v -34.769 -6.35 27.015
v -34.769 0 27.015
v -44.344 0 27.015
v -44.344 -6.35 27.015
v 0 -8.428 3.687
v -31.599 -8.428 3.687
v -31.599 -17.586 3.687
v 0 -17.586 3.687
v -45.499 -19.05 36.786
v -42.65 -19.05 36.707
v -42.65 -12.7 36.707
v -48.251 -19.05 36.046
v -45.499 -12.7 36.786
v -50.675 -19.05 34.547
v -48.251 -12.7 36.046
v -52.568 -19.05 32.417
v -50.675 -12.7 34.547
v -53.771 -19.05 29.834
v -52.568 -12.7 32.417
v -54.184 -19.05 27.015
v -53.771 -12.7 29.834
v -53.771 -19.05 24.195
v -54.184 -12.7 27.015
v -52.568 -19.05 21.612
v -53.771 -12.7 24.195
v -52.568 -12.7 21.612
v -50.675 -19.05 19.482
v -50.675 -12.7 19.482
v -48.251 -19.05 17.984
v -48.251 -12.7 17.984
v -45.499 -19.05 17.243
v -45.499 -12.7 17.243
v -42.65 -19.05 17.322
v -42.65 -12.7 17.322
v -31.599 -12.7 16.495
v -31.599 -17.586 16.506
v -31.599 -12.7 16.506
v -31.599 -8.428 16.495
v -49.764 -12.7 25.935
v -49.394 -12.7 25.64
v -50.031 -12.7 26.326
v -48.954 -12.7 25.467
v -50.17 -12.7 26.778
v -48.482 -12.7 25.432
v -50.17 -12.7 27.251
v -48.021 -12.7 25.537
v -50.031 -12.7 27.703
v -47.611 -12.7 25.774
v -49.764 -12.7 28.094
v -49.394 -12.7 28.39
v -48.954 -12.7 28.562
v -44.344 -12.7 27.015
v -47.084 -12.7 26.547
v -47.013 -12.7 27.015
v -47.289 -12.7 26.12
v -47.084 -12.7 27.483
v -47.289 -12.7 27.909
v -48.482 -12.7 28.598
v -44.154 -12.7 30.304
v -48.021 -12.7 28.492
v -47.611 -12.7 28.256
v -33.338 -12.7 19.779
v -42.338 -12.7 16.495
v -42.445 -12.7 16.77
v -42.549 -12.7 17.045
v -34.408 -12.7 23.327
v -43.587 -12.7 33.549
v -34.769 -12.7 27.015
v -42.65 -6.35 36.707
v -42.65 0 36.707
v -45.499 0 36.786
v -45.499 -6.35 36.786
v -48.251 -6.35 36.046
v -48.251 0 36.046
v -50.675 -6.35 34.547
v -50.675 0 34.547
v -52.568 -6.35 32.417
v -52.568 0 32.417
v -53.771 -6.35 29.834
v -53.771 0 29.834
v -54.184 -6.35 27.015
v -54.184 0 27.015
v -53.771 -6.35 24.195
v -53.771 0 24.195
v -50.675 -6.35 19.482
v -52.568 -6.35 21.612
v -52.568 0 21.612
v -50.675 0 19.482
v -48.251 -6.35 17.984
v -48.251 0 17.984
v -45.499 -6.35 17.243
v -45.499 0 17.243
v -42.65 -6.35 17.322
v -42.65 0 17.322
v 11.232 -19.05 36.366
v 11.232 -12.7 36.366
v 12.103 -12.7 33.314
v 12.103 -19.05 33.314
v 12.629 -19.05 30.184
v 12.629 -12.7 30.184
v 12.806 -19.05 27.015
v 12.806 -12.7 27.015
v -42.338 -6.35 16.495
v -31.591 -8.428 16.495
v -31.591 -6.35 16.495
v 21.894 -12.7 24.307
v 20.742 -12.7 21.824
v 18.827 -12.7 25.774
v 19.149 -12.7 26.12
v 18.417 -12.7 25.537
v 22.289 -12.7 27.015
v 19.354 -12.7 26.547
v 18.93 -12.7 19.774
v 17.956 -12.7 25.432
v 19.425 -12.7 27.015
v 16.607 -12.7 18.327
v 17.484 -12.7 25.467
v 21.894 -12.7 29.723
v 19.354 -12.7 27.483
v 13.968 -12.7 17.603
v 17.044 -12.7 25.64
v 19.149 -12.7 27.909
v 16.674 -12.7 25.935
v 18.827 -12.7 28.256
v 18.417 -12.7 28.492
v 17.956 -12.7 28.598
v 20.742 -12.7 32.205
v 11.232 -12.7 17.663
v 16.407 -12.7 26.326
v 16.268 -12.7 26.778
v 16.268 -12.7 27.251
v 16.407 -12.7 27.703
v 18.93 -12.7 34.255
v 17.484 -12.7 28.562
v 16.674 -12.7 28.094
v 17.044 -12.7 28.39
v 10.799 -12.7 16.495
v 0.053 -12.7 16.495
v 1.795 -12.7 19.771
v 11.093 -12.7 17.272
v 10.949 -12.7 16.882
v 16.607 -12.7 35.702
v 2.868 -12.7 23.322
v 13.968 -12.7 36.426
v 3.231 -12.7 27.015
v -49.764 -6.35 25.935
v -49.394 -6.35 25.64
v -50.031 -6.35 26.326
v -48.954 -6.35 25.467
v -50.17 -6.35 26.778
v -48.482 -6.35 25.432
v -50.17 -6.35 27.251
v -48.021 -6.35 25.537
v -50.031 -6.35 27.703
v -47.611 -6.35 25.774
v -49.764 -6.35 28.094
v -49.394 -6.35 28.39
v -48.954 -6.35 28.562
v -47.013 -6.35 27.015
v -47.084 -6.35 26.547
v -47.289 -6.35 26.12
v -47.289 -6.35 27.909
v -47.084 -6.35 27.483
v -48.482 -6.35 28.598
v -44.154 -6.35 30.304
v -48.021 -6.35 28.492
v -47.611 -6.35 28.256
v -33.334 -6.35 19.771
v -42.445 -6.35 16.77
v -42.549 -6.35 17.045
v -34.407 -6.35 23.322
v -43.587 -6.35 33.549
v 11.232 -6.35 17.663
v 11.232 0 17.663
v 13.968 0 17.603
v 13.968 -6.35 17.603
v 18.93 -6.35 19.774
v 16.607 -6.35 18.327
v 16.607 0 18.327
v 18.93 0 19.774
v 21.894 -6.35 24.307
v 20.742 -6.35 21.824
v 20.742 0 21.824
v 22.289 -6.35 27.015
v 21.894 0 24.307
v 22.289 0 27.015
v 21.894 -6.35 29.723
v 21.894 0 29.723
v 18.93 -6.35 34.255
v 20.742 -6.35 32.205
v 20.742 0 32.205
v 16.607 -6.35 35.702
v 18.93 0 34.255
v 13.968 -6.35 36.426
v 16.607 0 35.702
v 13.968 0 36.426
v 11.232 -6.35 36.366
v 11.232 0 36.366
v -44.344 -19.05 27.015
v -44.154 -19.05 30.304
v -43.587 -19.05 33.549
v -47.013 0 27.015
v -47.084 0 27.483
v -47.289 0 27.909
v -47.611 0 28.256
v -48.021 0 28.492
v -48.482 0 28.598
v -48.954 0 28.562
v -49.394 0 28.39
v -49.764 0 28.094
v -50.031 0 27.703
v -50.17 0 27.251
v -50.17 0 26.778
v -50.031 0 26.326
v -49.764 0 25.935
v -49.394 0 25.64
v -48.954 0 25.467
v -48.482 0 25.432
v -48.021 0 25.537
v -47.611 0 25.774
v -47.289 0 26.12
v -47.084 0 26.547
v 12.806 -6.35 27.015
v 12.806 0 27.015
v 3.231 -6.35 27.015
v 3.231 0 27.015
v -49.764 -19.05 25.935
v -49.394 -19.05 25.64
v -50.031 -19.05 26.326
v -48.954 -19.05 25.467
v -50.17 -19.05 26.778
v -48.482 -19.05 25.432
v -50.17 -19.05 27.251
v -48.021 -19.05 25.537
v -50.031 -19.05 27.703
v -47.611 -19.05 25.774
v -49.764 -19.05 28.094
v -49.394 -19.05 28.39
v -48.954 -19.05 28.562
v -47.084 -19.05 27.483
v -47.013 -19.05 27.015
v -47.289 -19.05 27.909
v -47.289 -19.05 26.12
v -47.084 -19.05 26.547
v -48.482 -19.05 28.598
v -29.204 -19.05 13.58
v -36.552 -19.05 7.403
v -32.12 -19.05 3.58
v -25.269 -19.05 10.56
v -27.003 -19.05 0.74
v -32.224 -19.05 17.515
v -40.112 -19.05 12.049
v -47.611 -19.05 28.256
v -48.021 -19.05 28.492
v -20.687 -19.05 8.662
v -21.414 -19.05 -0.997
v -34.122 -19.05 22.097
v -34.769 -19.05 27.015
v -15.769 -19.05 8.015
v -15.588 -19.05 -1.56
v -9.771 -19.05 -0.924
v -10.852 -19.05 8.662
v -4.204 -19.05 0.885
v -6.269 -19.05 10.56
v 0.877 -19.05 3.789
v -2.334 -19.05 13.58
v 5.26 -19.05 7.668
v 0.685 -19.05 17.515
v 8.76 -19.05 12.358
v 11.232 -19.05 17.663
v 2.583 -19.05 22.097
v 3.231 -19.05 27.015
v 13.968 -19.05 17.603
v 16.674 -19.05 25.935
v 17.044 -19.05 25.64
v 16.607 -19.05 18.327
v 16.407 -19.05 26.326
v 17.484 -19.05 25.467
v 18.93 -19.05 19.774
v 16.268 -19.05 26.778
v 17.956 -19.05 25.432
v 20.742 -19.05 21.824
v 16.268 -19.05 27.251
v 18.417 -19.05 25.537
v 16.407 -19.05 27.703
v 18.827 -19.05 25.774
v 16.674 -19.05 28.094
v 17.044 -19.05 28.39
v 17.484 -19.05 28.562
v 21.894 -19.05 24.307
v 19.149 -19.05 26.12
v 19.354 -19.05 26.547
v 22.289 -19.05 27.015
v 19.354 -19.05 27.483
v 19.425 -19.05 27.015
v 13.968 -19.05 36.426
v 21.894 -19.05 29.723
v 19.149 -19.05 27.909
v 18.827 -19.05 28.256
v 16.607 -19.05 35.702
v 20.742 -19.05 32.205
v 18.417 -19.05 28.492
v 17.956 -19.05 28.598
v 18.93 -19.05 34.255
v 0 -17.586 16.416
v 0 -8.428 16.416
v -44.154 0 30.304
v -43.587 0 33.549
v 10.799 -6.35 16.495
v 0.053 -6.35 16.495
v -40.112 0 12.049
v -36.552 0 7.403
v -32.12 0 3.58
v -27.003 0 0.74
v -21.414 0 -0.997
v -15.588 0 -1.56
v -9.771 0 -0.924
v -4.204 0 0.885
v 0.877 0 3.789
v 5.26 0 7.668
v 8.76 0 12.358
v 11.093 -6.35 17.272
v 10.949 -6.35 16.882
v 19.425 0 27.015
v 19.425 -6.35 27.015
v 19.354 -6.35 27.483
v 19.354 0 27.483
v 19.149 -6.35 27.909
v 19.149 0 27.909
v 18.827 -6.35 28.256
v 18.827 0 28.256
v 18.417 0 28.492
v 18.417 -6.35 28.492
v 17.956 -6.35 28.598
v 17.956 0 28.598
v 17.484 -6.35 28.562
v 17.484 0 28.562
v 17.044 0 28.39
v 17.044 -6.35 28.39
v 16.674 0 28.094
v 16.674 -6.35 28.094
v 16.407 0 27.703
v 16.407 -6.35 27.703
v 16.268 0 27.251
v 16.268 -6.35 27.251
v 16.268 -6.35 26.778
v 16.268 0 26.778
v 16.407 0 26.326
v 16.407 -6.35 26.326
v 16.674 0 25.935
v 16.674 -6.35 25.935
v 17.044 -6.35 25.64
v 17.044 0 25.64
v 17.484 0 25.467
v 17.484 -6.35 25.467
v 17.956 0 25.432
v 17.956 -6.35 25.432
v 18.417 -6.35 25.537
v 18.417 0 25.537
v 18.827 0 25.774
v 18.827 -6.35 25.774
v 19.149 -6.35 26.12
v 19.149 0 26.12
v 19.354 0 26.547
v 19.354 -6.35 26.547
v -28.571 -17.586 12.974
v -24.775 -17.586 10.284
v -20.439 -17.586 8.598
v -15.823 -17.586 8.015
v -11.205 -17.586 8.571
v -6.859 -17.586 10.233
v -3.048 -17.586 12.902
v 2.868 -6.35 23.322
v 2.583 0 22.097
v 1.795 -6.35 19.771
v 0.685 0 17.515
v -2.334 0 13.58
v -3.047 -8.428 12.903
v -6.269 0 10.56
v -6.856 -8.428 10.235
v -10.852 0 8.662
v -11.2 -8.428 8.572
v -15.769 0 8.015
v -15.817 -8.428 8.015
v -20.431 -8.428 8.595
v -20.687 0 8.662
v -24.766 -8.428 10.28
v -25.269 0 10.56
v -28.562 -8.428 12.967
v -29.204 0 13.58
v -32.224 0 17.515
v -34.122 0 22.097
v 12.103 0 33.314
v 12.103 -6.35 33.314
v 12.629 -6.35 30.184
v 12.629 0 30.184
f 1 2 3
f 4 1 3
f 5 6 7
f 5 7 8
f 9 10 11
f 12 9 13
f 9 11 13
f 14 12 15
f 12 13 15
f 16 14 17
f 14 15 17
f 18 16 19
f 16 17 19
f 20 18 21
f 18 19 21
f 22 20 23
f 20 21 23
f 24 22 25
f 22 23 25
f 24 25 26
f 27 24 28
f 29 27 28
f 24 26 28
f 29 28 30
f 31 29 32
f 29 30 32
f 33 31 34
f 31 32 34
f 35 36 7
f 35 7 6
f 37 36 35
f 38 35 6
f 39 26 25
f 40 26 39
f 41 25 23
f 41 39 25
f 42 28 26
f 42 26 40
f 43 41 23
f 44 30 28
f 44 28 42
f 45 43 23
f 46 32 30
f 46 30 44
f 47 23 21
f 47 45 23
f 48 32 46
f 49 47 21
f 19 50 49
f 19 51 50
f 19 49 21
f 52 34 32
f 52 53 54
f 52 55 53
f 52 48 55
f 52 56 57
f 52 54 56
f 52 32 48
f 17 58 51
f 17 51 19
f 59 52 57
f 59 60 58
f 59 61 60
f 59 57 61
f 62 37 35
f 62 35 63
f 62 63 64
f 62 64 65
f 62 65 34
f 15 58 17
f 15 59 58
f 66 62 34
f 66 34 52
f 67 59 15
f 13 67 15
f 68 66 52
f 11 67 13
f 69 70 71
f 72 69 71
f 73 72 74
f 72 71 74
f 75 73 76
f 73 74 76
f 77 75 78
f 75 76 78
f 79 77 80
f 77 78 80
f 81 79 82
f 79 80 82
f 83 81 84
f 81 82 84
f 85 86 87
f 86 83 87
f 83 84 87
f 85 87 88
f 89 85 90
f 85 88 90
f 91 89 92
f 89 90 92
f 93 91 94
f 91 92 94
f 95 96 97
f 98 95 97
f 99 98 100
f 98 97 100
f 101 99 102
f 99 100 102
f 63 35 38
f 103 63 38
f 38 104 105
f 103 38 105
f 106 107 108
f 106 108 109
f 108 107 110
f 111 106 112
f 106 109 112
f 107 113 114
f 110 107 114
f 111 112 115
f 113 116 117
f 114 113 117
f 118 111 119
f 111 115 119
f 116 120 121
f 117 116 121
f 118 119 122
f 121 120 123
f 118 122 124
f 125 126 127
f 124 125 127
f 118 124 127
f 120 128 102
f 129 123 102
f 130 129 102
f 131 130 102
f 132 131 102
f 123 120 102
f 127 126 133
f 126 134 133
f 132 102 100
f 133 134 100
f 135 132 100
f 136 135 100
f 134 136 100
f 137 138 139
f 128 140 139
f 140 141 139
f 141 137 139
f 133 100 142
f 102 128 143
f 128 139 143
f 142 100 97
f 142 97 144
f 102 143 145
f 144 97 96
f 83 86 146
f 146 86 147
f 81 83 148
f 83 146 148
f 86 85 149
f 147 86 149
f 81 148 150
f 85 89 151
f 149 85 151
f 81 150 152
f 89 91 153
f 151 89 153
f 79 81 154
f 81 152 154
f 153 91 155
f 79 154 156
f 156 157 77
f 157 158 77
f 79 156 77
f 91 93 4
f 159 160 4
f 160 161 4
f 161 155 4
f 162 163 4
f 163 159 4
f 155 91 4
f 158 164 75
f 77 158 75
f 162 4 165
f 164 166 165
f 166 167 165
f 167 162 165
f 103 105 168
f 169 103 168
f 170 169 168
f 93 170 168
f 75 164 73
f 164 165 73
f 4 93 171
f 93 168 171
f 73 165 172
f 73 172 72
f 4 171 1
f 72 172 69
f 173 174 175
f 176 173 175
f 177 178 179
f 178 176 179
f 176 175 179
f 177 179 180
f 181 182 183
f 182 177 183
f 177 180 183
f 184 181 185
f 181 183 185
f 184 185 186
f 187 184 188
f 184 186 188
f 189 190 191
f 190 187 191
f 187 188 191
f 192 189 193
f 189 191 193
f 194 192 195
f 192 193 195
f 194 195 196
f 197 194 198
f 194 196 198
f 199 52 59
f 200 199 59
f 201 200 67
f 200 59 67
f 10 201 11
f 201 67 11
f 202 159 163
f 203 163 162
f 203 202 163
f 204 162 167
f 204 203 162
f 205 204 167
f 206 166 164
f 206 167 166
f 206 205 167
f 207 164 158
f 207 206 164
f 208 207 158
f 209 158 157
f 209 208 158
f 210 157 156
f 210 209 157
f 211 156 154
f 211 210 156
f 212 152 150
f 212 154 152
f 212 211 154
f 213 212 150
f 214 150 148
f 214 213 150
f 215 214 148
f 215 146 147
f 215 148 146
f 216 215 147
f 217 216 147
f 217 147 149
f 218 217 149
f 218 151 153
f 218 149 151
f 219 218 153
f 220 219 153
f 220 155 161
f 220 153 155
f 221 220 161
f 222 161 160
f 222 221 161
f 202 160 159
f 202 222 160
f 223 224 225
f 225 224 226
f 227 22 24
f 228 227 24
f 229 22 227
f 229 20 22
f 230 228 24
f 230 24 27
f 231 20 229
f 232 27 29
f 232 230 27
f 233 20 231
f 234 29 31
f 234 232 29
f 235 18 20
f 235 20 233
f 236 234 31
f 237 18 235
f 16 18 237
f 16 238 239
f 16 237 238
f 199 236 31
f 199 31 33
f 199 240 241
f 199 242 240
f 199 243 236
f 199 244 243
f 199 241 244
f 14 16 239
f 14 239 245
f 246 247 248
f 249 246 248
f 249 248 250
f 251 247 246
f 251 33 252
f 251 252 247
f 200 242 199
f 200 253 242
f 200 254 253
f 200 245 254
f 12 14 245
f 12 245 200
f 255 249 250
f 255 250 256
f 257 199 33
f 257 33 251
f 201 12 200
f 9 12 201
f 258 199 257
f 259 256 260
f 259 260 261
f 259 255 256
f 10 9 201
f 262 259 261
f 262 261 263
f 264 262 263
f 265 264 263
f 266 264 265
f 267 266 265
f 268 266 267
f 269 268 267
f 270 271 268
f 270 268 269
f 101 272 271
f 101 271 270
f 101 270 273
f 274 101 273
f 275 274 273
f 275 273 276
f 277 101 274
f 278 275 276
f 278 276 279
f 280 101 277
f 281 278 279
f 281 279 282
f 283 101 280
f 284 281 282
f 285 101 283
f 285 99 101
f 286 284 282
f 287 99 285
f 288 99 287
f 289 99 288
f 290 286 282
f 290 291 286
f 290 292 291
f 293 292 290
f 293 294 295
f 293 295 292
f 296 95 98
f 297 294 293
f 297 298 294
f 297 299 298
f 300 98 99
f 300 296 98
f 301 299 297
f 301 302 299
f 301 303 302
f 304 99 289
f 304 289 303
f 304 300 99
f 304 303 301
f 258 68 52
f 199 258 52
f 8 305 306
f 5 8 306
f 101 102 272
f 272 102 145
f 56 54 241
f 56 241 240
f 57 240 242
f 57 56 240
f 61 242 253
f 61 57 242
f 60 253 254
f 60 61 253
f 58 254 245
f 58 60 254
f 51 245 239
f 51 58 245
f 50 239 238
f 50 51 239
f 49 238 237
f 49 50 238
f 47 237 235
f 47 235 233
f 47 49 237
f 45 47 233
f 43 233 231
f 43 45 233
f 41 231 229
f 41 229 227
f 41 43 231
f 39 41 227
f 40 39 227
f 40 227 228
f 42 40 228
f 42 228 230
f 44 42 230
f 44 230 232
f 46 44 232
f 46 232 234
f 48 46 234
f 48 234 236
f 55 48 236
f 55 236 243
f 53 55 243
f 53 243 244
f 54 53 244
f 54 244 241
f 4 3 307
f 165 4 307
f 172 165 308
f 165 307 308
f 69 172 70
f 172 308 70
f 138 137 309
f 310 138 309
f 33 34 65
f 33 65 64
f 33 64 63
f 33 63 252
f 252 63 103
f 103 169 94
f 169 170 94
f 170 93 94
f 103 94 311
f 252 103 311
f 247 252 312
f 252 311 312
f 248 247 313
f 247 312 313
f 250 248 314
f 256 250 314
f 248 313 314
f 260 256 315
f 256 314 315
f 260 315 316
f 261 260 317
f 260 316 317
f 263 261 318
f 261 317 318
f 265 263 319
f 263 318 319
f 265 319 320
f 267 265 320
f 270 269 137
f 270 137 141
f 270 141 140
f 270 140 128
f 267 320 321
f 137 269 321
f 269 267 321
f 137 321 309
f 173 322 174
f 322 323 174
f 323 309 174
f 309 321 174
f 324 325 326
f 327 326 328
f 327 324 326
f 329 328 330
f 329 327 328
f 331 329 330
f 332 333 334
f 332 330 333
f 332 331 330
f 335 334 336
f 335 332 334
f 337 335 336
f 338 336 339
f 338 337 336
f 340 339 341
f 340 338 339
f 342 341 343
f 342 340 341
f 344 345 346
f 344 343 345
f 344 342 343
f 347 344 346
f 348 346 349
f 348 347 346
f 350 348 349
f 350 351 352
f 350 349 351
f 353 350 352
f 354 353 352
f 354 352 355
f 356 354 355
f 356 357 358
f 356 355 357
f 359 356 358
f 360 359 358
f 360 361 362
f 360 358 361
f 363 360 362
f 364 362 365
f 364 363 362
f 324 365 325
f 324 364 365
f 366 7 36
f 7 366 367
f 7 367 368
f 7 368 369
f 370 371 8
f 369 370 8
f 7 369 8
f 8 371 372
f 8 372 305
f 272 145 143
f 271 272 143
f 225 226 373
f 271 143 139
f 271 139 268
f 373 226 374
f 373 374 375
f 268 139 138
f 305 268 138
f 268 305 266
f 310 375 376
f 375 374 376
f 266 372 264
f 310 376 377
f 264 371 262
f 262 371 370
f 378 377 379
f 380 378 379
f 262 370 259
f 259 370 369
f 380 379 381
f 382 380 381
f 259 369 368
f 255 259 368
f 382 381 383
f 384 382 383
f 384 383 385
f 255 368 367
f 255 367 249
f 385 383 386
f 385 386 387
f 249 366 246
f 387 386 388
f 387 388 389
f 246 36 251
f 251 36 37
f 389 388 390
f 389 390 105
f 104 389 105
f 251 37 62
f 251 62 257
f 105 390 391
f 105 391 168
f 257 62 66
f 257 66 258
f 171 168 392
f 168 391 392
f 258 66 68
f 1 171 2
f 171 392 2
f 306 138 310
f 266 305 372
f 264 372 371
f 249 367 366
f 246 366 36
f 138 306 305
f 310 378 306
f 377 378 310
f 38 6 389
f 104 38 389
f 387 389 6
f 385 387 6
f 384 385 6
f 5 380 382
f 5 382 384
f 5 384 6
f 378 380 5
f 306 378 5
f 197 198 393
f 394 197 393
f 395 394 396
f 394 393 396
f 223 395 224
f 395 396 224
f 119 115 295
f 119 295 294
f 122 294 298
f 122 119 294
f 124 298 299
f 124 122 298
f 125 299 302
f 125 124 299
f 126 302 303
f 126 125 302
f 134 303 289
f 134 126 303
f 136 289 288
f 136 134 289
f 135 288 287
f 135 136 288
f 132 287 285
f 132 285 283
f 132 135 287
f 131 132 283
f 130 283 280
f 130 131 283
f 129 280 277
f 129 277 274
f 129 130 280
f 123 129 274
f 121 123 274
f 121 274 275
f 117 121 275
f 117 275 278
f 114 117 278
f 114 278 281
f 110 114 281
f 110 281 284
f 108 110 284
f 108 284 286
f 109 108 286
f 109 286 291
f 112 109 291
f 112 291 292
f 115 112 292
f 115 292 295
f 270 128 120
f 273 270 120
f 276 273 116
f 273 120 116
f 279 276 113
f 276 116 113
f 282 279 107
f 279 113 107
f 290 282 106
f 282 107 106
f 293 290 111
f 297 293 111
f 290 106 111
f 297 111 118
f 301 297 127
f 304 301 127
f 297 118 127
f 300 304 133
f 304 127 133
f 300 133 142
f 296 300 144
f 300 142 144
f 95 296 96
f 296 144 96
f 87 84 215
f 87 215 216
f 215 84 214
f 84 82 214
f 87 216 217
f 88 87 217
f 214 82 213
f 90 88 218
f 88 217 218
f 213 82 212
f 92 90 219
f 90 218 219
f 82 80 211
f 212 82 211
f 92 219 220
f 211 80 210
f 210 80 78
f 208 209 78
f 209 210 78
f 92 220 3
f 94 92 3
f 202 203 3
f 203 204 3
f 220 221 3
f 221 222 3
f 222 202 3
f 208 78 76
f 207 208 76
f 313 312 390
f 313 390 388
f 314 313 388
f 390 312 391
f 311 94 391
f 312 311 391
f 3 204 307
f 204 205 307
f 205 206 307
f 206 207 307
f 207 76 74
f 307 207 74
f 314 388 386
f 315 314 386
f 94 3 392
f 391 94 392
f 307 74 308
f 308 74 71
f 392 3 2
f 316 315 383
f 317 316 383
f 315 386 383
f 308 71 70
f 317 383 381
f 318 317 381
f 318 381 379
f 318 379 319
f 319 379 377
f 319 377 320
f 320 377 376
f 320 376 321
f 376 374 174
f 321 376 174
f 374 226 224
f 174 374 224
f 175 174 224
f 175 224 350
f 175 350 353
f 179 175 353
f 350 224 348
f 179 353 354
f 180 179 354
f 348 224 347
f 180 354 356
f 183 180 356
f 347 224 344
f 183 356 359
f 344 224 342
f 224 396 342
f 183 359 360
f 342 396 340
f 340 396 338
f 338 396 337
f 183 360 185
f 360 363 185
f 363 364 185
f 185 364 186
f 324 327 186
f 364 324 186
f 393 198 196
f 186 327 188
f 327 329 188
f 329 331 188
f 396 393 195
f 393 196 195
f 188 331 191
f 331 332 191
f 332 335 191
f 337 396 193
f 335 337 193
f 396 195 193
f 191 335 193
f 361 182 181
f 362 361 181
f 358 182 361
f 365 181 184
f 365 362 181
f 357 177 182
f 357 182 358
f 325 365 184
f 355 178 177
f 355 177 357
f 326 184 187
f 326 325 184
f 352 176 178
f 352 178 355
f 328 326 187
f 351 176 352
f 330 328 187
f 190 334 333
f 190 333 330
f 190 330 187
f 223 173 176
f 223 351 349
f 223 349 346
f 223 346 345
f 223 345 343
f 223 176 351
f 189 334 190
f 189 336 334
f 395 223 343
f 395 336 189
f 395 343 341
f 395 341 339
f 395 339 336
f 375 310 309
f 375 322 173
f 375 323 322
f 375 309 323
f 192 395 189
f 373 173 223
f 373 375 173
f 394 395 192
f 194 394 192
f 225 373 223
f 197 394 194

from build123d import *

# Parameters (mm, degrees)
F0_R          = 1.5875
F1_DEPTH      = 19.05
F2_W          = 6.35
F2_H          = 21.8940776977
F3_DEPTH      = 69.31141
F3_DEPTH_BACK = 25.4
F5_W          = 31.5987952054
F5_H          = 9.1577427173
F6_DEPTH      = 33.02


with BuildPart() as f1:
    # F0 (on Front) → F1 (new body)
    with BuildSketch(Plane.XZ):
        with BuildLine():
            ThreePointArc((3.2306237647, 27.0146857947), (-15.7693382353, 8.0147237947), (-34.7693002353, 27.0146857947))
            Line((-34.7693002353, 27.0146857947), (-44.3443382353, 27.0146857947))
            ThreePointArc((-44.3443382353, 27.0146857947), (-43.9176321109, 31.9344598635), (-42.6502576132, 36.7073014581))
            ThreePointArc((-42.6502576132, 36.7073014581), (-54.1838863729, 27.0146857947), (-42.6502576132, 17.3220701313))
            ThreePointArc((-42.6502576132, 17.3220701313), (-15.5884947503, -1.5597419447), (11.2321092838, 17.6630839601))
            ThreePointArc((11.2321092838, 17.6630839601), (22.288726896, 27.0146857947), (11.2321092838, 36.3662876293))
            ThreePointArc((11.2321092838, 36.3662876293), (12.4095278514, 31.7562183603), (12.8056617647, 27.0146857947))
            Line((12.8056617647, 27.0146857947), (3.2306237647, 27.0146857947))
        make_face()
        with Locations((-48.6005805433, 27.0146857947)):
            Circle(F0_R, mode=Mode.SUBTRACT)
        with Locations((17.8374499083, 27.0146857947)):
            Circle(F0_R, mode=Mode.SUBTRACT)
    extrude(amount=F1_DEPTH)

    # F2 (on Right) → F3 (cut, two sides)
    with BuildSketch(Plane.YZ) as f3_sk:
        with Locations((-9.525, 27.4422825678)):
            Rectangle(F2_W, F2_H)
    extrude(amount=-F3_DEPTH, mode=Mode.SUBTRACT)
    extrude(f3_sk.sketch, amount=F3_DEPTH_BACK, mode=Mode.SUBTRACT)

    # F5 (on plane+point) → F6 (cut)
    with BuildSketch(Plane.XY.offset(36.7073014581)):
        with Locations((-15.7993976027, -13.0069836187)):
            Rectangle(F5_W, F5_H)
    extrude(amount=-F6_DEPTH, mode=Mode.SUBTRACT)


solid = f1.part
